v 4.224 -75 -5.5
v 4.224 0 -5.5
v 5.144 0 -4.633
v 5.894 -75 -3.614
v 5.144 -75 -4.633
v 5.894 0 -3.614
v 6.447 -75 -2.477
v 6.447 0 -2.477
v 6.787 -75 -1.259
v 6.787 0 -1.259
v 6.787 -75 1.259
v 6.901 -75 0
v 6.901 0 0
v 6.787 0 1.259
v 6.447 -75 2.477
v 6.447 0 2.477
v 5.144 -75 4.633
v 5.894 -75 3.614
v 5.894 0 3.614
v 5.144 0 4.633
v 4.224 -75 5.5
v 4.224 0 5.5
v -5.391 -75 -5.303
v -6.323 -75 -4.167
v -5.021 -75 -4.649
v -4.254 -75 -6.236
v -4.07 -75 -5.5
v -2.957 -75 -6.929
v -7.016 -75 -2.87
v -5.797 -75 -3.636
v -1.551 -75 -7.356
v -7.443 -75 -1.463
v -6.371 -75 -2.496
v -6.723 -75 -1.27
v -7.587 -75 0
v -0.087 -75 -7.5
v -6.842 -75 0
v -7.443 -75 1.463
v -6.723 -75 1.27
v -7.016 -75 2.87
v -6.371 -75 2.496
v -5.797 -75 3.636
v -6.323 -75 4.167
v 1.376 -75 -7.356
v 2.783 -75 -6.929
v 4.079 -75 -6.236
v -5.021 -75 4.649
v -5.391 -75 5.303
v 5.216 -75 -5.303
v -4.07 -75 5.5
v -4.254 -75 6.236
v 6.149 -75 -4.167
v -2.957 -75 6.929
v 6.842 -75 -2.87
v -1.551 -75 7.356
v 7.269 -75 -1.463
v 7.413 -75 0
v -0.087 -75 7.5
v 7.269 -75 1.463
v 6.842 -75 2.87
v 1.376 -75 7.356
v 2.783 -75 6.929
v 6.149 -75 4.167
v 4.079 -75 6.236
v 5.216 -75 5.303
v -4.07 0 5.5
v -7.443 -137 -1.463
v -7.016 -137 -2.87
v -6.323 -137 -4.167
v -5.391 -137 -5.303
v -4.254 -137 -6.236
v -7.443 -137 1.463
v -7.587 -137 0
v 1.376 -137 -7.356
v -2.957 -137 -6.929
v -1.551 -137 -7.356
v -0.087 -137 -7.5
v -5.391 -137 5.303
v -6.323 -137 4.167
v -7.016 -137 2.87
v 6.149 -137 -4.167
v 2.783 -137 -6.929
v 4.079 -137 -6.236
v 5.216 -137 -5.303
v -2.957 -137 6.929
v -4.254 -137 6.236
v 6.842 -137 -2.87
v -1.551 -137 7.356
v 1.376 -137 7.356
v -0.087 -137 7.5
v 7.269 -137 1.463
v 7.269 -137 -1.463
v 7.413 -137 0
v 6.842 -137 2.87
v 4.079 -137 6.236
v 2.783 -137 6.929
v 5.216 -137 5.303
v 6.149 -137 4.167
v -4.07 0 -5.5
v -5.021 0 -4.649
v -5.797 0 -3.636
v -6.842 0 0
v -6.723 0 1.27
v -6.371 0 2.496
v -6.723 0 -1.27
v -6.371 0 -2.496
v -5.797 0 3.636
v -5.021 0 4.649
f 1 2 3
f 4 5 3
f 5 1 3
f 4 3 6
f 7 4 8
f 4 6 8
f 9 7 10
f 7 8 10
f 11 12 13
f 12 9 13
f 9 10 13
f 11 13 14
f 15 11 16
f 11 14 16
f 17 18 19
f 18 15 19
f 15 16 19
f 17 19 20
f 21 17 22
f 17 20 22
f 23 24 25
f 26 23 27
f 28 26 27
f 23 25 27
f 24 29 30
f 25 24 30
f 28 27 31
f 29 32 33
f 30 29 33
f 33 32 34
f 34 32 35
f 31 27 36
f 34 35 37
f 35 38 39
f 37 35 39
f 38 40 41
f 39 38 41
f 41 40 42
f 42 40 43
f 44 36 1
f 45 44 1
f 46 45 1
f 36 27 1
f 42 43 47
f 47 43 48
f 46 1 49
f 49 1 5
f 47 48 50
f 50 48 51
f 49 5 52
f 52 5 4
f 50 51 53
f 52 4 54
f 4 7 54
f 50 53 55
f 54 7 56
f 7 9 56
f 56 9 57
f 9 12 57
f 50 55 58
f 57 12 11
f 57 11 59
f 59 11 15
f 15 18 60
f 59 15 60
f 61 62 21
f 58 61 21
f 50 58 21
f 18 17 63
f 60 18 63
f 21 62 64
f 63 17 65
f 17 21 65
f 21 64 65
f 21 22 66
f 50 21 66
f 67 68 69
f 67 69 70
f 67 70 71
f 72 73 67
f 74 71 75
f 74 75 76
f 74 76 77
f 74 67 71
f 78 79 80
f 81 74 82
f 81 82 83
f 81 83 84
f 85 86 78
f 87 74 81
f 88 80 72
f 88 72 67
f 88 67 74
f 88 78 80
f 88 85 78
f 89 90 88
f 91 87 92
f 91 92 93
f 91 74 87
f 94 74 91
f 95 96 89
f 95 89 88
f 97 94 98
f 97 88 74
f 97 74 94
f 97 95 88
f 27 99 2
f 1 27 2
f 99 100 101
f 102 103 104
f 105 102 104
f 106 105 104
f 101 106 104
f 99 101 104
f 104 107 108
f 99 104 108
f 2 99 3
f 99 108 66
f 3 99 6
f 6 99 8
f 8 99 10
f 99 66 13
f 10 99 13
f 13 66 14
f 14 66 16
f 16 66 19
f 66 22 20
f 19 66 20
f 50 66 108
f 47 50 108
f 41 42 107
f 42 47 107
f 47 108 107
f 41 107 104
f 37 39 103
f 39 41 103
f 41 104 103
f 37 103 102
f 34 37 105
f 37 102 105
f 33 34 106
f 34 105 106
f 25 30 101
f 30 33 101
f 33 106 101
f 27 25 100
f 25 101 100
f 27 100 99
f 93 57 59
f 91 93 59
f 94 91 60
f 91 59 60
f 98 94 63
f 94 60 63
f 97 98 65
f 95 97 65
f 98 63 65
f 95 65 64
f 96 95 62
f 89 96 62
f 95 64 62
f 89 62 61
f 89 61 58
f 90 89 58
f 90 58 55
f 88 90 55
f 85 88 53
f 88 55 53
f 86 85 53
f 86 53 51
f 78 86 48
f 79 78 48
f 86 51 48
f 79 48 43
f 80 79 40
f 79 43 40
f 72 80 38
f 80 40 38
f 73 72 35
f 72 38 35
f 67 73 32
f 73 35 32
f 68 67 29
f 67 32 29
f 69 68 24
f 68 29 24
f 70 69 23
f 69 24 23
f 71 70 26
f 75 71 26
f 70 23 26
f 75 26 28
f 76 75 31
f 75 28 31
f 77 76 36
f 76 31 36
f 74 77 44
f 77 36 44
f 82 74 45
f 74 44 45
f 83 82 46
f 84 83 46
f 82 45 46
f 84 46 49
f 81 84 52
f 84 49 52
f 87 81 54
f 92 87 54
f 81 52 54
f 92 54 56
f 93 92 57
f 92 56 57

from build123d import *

# Parameters (mm, degrees)
F0_R     = 4
F1_DEPTH = 130
F2_START = 75
F0_R_2   = 7.5
F2_DEPTH = 62
F3_DEPTH = 7


with BuildPart() as f1:
    # F0 (on Front) → F1 (new body)
    with BuildSketch(Plane.XZ):
        with BuildLine():
            Line((4.2239325422, 5.5), (-4.0704200721, 5.5))
            ThreePointArc((-4.0704200721, 5.5), (-6.8423913629, 0), (-4.0704200721, -5.5))
            Line((-4.0704200721, -5.5), (4.2239325422, -5.5))
            ThreePointArc((4.2239325422, -5.5), (6.9010050788, 0), (4.2239325422, 5.5))
        make_face()
        Circle(F0_R, mode=Mode.SUBTRACT)
        Circle(F0_R)
    extrude(amount=F1_DEPTH)

    # F0 (on Front) → F2 (join)
    with BuildSketch(Plane.XZ.offset(F2_START)):
        with Locations((-0.087359423, 0)):
            Circle(F0_R_2)
        with BuildLine():
            ThreePointArc((-4.0704200721, -5.5), (-6.8423913629, 0), (-4.0704200721, 5.5))
            Line((-4.0704200721, 5.5), (4.2239325422, 5.5))
            ThreePointArc((4.2239325422, 5.5), (6.9010050788, 0), (4.2239325422, -5.5))
            Line((4.2239325422, -5.5), (-4.0704200721, -5.5))
        make_face(mode=Mode.SUBTRACT)
    extrude(amount=F2_DEPTH)

    # F3 (add): a face of the model
    f3_faces = [f1.faces().sort_by_distance(p)[0] for p in [
        (0.0391395294, -130, 0),
    ]]
    extrude(f3_faces, amount=F3_DEPTH)


solid = f1.part
